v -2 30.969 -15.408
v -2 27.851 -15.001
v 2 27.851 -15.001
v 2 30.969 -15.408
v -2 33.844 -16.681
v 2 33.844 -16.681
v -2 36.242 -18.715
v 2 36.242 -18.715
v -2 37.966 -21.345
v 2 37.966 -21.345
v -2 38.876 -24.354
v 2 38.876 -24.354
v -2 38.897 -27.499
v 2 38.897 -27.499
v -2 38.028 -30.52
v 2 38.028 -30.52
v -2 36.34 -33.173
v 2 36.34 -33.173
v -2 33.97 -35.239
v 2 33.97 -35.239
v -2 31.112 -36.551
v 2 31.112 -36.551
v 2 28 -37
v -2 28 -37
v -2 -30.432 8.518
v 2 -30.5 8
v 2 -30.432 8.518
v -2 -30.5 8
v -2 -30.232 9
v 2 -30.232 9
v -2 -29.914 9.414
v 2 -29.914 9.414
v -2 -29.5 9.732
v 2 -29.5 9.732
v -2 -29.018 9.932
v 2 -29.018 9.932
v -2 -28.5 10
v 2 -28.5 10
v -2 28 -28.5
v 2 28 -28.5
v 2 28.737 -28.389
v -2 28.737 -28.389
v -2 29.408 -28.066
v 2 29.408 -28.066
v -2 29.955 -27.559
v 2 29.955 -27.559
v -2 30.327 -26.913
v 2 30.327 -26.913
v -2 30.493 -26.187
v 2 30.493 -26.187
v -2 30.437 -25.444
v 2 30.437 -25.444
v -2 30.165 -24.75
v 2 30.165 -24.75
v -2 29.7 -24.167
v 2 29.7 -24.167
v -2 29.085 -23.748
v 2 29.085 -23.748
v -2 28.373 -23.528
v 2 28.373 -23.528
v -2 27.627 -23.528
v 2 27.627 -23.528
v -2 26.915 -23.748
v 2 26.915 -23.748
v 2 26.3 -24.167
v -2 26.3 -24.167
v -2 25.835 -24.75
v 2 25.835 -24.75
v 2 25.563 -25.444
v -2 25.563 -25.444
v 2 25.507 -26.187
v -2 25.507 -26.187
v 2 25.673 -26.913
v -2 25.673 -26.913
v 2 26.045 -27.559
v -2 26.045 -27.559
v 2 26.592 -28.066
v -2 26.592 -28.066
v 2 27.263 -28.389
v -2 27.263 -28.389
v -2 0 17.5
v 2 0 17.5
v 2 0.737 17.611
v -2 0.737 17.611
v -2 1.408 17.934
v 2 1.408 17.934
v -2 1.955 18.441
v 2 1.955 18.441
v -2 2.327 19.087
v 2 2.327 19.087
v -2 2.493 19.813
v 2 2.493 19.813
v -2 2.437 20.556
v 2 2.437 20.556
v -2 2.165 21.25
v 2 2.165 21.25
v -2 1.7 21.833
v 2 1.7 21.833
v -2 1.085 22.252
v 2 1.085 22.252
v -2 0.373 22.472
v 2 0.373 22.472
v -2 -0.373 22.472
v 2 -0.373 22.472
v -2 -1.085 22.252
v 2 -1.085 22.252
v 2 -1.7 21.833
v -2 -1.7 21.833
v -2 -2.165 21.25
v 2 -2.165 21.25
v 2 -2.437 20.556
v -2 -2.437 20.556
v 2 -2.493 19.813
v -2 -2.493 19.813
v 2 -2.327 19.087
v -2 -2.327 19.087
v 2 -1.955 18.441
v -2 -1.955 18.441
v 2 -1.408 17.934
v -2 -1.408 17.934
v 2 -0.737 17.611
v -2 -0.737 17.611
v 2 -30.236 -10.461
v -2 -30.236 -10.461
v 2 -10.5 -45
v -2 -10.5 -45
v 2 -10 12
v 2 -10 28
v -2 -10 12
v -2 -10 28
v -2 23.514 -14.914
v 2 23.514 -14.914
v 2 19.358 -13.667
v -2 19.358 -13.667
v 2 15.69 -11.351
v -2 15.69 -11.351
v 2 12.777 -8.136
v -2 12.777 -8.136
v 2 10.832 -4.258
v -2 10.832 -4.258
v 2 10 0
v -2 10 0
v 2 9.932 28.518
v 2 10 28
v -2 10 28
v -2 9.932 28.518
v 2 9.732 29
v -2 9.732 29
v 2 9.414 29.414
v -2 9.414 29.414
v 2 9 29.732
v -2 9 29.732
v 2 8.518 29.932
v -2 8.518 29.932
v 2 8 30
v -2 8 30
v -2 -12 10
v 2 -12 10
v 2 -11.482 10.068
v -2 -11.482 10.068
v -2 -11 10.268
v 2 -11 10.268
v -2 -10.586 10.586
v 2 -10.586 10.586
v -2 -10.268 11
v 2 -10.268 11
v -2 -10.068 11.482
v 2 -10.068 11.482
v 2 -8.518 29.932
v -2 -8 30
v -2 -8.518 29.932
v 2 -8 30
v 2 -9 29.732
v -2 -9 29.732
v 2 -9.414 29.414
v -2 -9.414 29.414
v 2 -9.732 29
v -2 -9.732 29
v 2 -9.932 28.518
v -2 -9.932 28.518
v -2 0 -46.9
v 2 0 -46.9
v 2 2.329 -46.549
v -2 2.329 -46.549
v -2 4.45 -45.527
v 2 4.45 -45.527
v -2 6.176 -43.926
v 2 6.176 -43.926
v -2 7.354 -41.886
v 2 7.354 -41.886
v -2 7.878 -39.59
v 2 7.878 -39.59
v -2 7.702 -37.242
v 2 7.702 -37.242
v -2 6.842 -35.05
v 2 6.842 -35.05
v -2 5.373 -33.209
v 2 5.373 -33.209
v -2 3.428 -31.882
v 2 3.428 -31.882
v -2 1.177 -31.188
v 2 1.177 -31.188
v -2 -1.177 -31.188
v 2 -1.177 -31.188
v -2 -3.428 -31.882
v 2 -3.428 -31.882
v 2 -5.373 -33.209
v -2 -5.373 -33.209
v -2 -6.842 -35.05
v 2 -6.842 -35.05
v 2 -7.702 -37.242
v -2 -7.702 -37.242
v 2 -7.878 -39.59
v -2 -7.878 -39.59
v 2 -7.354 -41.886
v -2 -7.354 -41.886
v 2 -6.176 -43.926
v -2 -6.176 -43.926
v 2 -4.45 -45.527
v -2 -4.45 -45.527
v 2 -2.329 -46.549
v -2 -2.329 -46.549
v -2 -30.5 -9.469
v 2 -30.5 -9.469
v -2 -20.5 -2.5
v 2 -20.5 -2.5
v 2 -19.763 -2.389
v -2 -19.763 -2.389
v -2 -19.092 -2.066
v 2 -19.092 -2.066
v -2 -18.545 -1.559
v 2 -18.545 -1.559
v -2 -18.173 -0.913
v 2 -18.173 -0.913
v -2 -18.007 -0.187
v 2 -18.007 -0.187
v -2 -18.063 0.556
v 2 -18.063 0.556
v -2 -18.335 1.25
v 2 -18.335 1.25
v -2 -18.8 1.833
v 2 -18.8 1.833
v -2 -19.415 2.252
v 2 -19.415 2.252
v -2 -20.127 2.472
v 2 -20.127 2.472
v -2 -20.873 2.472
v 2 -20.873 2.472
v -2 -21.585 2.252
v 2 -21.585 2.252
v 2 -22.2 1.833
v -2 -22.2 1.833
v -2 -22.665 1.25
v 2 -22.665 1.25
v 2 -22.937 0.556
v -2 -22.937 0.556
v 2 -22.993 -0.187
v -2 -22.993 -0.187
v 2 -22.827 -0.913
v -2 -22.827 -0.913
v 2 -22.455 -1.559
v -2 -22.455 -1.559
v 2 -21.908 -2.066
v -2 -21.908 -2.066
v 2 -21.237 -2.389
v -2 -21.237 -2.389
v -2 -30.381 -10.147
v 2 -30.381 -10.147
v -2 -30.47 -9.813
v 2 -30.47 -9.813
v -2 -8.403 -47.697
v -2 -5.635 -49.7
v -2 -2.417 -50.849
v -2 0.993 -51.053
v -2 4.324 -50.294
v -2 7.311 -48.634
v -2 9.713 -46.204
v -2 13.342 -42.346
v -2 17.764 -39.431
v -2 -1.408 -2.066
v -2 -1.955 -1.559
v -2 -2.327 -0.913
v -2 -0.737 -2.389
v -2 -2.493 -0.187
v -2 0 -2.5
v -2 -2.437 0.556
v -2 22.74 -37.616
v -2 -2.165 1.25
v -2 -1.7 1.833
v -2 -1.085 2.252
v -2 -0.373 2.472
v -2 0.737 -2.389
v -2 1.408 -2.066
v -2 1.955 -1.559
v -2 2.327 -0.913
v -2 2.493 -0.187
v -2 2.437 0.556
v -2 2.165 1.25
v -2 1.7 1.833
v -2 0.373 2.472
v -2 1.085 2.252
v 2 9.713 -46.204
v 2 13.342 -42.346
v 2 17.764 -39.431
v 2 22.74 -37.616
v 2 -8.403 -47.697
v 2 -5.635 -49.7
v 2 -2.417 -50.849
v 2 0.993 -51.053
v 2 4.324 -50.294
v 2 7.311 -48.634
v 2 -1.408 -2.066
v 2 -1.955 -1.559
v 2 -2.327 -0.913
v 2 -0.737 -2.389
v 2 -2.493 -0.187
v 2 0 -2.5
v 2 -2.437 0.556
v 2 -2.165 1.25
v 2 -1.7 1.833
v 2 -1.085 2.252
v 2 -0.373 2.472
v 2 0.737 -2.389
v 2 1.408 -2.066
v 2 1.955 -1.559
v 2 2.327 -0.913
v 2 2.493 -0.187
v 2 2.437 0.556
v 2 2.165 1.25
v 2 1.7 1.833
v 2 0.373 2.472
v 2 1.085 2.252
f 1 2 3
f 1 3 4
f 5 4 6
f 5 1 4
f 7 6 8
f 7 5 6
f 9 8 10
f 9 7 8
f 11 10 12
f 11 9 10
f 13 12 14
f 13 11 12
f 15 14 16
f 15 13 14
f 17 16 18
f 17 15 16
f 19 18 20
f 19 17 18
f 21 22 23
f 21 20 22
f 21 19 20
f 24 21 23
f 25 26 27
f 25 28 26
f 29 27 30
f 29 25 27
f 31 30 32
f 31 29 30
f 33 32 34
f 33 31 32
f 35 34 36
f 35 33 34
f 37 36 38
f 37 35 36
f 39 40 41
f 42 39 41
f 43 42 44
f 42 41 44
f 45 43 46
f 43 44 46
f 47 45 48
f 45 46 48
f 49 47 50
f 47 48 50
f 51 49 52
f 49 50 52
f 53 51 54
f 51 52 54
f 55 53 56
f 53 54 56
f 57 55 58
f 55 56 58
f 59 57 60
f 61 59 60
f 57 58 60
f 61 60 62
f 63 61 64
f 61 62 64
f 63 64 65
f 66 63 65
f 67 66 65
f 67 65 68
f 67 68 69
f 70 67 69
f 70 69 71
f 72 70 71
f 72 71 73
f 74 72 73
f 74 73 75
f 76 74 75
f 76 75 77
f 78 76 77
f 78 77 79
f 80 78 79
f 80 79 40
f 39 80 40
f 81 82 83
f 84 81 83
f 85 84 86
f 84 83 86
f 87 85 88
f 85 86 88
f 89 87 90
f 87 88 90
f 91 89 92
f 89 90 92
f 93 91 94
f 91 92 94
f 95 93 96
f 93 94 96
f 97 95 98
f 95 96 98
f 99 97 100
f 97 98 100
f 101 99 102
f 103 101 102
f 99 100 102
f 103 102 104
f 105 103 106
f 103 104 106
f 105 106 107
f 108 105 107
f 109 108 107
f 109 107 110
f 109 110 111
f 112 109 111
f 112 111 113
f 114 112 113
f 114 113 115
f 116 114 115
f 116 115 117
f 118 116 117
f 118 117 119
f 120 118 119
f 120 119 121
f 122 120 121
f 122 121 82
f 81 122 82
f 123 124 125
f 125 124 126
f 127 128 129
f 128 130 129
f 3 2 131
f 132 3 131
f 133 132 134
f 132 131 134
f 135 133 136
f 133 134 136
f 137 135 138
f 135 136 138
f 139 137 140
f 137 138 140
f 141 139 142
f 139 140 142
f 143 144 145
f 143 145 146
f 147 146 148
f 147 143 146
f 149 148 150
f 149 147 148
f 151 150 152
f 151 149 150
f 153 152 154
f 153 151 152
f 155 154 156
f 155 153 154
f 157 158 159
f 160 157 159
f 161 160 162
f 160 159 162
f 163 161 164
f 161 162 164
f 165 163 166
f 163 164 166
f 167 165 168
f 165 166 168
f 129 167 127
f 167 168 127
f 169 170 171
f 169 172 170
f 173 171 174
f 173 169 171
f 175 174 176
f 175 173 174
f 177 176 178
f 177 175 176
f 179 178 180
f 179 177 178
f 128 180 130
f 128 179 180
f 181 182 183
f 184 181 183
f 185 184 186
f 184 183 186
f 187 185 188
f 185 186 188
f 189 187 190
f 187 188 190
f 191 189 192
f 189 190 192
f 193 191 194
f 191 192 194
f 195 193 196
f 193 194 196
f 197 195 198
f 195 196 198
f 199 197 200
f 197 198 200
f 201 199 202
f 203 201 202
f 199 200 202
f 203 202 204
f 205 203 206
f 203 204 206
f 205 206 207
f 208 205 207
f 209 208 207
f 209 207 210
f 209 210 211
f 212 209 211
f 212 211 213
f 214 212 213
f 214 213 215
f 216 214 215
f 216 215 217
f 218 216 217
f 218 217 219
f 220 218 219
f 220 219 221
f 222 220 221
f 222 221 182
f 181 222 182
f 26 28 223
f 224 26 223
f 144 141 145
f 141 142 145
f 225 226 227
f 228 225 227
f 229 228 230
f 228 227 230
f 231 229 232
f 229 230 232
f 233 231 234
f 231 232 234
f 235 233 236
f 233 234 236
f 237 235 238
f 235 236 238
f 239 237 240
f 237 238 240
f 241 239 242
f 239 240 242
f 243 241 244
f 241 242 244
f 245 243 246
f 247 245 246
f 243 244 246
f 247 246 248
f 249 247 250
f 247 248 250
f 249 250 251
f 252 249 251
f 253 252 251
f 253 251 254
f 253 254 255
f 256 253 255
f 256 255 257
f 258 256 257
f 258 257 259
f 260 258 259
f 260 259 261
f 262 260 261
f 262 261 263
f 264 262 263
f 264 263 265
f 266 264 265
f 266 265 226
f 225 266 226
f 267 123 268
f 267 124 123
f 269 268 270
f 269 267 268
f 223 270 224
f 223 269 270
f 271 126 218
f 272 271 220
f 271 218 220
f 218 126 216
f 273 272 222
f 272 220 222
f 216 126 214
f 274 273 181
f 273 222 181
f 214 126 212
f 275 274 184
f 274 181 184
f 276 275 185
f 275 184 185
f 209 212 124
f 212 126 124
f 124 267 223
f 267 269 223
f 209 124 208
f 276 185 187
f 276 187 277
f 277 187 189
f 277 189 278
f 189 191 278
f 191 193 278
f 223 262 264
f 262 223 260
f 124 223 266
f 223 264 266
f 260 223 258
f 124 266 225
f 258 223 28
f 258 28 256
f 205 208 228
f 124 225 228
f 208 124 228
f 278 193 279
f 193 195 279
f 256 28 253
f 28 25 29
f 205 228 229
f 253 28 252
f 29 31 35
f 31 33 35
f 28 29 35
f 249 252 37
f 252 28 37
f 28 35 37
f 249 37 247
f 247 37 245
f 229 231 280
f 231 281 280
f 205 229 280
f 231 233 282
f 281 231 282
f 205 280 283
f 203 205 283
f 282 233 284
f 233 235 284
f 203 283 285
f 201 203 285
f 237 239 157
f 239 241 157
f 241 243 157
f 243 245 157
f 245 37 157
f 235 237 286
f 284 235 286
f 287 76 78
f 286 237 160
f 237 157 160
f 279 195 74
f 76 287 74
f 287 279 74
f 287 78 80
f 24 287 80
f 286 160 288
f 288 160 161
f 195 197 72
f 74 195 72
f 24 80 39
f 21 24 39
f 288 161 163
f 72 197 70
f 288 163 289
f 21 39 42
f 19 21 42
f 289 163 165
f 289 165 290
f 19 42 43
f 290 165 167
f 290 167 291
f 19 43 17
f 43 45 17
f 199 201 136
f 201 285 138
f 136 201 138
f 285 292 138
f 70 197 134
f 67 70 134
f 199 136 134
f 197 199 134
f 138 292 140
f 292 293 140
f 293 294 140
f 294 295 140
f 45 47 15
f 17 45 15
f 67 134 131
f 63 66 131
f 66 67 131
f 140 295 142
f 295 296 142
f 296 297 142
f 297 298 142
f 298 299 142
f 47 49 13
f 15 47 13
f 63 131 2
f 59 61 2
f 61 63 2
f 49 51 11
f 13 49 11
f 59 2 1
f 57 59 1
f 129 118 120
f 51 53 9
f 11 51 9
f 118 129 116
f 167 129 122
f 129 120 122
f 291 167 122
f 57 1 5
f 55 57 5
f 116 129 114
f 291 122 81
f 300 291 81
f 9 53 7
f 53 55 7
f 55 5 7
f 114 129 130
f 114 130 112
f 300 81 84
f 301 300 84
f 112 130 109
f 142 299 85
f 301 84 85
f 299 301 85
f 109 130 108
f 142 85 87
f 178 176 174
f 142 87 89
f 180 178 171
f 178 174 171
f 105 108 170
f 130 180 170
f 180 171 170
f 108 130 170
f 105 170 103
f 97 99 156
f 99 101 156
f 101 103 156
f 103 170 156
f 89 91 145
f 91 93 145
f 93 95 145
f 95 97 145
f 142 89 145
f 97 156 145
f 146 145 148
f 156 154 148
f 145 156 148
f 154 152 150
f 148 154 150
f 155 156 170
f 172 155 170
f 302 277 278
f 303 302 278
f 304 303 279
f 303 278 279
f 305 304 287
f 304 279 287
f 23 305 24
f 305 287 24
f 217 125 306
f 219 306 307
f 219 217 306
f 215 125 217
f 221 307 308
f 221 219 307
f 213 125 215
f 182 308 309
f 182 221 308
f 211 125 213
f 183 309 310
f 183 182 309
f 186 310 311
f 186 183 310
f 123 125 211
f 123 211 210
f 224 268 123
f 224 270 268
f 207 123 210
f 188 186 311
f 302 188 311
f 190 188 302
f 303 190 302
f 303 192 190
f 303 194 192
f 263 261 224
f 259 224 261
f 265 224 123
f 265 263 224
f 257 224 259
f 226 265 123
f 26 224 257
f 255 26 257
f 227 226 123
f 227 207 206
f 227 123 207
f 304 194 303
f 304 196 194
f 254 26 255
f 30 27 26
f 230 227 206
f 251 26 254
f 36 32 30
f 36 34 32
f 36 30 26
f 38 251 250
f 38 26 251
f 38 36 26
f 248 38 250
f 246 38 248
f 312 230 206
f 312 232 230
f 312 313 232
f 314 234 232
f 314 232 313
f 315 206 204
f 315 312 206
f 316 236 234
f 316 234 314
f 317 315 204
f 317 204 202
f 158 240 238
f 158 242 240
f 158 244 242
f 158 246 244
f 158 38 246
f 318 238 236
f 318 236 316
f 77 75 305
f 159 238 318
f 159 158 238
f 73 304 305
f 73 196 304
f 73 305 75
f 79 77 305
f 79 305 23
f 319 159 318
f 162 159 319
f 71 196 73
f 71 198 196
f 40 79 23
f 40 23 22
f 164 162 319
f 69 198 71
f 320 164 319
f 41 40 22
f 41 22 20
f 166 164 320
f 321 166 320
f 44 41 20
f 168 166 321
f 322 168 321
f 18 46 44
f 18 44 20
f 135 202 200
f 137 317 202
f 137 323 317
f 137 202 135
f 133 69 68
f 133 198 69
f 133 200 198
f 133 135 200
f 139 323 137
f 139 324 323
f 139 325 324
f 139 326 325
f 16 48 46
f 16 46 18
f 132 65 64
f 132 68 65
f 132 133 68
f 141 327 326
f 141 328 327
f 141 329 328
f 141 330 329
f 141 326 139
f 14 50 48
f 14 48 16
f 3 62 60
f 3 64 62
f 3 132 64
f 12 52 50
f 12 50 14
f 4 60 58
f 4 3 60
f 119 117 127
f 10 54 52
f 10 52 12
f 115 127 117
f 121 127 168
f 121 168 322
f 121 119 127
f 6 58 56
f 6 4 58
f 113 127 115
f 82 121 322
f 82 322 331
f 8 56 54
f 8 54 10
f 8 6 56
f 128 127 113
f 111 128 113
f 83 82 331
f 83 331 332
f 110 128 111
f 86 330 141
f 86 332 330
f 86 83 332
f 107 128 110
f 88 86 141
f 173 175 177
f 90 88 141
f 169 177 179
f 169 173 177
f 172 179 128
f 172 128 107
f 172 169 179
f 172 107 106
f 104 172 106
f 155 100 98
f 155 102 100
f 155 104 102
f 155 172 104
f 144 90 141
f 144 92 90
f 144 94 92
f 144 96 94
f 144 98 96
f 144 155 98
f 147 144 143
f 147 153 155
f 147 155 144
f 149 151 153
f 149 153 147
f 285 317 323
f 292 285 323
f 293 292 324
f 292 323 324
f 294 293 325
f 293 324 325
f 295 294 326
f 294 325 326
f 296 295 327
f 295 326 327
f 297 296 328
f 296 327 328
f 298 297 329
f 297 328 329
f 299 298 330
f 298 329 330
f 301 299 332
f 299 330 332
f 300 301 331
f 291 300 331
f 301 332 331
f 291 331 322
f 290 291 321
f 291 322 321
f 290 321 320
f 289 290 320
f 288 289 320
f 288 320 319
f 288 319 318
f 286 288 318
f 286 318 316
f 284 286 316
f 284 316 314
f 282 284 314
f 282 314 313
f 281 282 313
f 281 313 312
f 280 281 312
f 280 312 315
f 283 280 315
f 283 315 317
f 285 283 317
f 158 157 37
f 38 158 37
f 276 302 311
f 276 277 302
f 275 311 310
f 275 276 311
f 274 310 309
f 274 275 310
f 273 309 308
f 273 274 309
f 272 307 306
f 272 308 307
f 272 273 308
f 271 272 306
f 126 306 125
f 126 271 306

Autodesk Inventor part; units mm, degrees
ref_plane "YZ Plane" through (0, 0, 0) normal (1, 0, 0) x (0, 1, 0)
ref_plane "XZ Plane" through (0, 0, 0) normal (0, 1, 0) x (-1, 0, 0)
ref_plane "XY Plane" through (0, 0, 0) normal (0, 0, 1) x (1, 0, 0)
sketch "Skizze1" plane through (0, 0, 0) normal (1, 0, 0) x (0, 1, 0)
  line L0 (10, 30) -> (-10, 30)
  line L1 (-10, 30) -> (-10, 10)
  line L2 (-10, 10) -> (-30.5, 10)
  line L3 (-30.5, 10) -> (-30.5, -10)
  line L4 (-30.5, -10) -> (-30.5, -10)
  line L5 (-30.5, -10) -> (-10.5, -45)
  line L6 (10, 0) -> (10, 30)
  arc A0 (28, -37) -> (27.8513, -15.001) centre (28, -26) ccw
  arc A1 (10, 0) -> (27.8513, -15.001) centre (26, 0.918) ccw
  arc A2 (-10.5, -45) -> (9.7132, -46.2044) centre (0, -39) ccw
  arc A3 (28, -37) -> (9.7132, -46.2044) centre (28, -59.7678) ccw
  point P0 (0, 0)
  point P1 (-30.5, 0)
  point P2 (0, 30)
  dimension "d0" = 20
  dimension "d1" = 20
  dimension "d3" = 40
  dimension "d6" = 0
  dimension "d41" = 20
  dimension "d43" = 22
  dimension "d45" = 18
  dimension "d56" = 16
  dimension "d60" = 45
  dimension "d61" = 39
  dimension "d62" = 10
  dimension "d63" = 18
  dimension "d67" = 26
  dimension "d68" = 0.918
extrude "Extrusion1" add sketch "Skizze1" along normal mid plane 4
fillet "Rundung1" radius 2 5 edges at (0, 10, 30) (0, -10, 30) (0, -10, 10) (0, -30.5, 10) (0, -30.5, -10)
sketch "Skizze2" plane through (2, 0, 0) normal (1, 0, 0) x (0, 0, -1)
  circle A0 centre (-20, 0) radius 2.5
  circle A1 centre (0, 0) radius 2.5
  circle A2 centre (0, -20.5) radius 2.5
  circle A3 centre (39, 0) radius 7.9
  line L0 (-8, -30.5) -> (9.4689, -30.5) projected
  line L1 (-30, 8) -> (-30, -8) projected
  line L2 (0, 10) -> (-28, 10) projected
  circle A4 centre (26, 28) radius 2.5
  arc A5 (37, 28) -> (15.001, 27.8513) centre (26, 28) ccw projected
  point P0 (0, 0)
  point P1 (0.7344, -30.5)
  dimension "d10" = 5
  dimension "d11" = 5
  dimension "d12" = 5
  dimension "d13" = 10
  dimension "d14" = 20
  dimension "d15" = 10
  dimension "d16" = 15.8
  dimension "d58" = 0
  dimension "d64" = 5
  dimension "d69" = 39
extrude "Extrusion2" cut sketch "Skizze2" against normal through all
properties part number "KettenBlech_Oben_Hinten"
